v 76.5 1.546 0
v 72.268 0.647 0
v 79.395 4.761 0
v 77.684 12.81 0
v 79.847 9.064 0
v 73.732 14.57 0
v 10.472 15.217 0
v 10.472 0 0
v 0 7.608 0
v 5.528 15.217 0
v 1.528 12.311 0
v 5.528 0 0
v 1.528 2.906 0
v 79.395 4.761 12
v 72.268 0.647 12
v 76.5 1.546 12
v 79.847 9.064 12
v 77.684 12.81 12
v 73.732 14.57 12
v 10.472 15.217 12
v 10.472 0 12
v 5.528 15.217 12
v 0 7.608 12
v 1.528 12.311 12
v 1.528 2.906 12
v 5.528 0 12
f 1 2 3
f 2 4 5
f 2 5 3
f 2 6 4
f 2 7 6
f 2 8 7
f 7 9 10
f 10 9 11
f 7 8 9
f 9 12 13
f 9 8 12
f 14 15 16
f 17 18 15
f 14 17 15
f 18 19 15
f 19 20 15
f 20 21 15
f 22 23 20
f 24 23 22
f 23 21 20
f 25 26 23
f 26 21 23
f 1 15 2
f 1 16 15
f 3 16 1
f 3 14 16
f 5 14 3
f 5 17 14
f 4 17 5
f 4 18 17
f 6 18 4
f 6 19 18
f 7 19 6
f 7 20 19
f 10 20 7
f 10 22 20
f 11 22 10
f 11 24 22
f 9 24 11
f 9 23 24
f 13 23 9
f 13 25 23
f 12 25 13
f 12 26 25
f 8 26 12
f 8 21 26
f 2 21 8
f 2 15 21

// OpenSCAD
$fn = 32;

// ----------------------------------------------------------------------
// Lever arm: two bosses 16 and 14 mm, 65 mm between centres
// ----------------------------------------------------------------------

// --- parameters (mm) ---
profile_height = 12;      // extrusion height
profile_points = 13;      // points of the closed outline

profile = [[0, 7.608], [1.528, 2.906], [5.528, 0], [10.472, 0], [72.268, 0.647], [76.5, 1.546], [79.395, 4.761], [79.847, 9.064], [77.684, 12.81], [73.732, 14.57], [10.472, 15.217], [5.528, 15.217], [1.528, 12.311]];  // single closed polygon, 13 points, counter clockwise

// --- the one profile operation ---
linear_extrude(height = profile_height) polygon(points = profile);
